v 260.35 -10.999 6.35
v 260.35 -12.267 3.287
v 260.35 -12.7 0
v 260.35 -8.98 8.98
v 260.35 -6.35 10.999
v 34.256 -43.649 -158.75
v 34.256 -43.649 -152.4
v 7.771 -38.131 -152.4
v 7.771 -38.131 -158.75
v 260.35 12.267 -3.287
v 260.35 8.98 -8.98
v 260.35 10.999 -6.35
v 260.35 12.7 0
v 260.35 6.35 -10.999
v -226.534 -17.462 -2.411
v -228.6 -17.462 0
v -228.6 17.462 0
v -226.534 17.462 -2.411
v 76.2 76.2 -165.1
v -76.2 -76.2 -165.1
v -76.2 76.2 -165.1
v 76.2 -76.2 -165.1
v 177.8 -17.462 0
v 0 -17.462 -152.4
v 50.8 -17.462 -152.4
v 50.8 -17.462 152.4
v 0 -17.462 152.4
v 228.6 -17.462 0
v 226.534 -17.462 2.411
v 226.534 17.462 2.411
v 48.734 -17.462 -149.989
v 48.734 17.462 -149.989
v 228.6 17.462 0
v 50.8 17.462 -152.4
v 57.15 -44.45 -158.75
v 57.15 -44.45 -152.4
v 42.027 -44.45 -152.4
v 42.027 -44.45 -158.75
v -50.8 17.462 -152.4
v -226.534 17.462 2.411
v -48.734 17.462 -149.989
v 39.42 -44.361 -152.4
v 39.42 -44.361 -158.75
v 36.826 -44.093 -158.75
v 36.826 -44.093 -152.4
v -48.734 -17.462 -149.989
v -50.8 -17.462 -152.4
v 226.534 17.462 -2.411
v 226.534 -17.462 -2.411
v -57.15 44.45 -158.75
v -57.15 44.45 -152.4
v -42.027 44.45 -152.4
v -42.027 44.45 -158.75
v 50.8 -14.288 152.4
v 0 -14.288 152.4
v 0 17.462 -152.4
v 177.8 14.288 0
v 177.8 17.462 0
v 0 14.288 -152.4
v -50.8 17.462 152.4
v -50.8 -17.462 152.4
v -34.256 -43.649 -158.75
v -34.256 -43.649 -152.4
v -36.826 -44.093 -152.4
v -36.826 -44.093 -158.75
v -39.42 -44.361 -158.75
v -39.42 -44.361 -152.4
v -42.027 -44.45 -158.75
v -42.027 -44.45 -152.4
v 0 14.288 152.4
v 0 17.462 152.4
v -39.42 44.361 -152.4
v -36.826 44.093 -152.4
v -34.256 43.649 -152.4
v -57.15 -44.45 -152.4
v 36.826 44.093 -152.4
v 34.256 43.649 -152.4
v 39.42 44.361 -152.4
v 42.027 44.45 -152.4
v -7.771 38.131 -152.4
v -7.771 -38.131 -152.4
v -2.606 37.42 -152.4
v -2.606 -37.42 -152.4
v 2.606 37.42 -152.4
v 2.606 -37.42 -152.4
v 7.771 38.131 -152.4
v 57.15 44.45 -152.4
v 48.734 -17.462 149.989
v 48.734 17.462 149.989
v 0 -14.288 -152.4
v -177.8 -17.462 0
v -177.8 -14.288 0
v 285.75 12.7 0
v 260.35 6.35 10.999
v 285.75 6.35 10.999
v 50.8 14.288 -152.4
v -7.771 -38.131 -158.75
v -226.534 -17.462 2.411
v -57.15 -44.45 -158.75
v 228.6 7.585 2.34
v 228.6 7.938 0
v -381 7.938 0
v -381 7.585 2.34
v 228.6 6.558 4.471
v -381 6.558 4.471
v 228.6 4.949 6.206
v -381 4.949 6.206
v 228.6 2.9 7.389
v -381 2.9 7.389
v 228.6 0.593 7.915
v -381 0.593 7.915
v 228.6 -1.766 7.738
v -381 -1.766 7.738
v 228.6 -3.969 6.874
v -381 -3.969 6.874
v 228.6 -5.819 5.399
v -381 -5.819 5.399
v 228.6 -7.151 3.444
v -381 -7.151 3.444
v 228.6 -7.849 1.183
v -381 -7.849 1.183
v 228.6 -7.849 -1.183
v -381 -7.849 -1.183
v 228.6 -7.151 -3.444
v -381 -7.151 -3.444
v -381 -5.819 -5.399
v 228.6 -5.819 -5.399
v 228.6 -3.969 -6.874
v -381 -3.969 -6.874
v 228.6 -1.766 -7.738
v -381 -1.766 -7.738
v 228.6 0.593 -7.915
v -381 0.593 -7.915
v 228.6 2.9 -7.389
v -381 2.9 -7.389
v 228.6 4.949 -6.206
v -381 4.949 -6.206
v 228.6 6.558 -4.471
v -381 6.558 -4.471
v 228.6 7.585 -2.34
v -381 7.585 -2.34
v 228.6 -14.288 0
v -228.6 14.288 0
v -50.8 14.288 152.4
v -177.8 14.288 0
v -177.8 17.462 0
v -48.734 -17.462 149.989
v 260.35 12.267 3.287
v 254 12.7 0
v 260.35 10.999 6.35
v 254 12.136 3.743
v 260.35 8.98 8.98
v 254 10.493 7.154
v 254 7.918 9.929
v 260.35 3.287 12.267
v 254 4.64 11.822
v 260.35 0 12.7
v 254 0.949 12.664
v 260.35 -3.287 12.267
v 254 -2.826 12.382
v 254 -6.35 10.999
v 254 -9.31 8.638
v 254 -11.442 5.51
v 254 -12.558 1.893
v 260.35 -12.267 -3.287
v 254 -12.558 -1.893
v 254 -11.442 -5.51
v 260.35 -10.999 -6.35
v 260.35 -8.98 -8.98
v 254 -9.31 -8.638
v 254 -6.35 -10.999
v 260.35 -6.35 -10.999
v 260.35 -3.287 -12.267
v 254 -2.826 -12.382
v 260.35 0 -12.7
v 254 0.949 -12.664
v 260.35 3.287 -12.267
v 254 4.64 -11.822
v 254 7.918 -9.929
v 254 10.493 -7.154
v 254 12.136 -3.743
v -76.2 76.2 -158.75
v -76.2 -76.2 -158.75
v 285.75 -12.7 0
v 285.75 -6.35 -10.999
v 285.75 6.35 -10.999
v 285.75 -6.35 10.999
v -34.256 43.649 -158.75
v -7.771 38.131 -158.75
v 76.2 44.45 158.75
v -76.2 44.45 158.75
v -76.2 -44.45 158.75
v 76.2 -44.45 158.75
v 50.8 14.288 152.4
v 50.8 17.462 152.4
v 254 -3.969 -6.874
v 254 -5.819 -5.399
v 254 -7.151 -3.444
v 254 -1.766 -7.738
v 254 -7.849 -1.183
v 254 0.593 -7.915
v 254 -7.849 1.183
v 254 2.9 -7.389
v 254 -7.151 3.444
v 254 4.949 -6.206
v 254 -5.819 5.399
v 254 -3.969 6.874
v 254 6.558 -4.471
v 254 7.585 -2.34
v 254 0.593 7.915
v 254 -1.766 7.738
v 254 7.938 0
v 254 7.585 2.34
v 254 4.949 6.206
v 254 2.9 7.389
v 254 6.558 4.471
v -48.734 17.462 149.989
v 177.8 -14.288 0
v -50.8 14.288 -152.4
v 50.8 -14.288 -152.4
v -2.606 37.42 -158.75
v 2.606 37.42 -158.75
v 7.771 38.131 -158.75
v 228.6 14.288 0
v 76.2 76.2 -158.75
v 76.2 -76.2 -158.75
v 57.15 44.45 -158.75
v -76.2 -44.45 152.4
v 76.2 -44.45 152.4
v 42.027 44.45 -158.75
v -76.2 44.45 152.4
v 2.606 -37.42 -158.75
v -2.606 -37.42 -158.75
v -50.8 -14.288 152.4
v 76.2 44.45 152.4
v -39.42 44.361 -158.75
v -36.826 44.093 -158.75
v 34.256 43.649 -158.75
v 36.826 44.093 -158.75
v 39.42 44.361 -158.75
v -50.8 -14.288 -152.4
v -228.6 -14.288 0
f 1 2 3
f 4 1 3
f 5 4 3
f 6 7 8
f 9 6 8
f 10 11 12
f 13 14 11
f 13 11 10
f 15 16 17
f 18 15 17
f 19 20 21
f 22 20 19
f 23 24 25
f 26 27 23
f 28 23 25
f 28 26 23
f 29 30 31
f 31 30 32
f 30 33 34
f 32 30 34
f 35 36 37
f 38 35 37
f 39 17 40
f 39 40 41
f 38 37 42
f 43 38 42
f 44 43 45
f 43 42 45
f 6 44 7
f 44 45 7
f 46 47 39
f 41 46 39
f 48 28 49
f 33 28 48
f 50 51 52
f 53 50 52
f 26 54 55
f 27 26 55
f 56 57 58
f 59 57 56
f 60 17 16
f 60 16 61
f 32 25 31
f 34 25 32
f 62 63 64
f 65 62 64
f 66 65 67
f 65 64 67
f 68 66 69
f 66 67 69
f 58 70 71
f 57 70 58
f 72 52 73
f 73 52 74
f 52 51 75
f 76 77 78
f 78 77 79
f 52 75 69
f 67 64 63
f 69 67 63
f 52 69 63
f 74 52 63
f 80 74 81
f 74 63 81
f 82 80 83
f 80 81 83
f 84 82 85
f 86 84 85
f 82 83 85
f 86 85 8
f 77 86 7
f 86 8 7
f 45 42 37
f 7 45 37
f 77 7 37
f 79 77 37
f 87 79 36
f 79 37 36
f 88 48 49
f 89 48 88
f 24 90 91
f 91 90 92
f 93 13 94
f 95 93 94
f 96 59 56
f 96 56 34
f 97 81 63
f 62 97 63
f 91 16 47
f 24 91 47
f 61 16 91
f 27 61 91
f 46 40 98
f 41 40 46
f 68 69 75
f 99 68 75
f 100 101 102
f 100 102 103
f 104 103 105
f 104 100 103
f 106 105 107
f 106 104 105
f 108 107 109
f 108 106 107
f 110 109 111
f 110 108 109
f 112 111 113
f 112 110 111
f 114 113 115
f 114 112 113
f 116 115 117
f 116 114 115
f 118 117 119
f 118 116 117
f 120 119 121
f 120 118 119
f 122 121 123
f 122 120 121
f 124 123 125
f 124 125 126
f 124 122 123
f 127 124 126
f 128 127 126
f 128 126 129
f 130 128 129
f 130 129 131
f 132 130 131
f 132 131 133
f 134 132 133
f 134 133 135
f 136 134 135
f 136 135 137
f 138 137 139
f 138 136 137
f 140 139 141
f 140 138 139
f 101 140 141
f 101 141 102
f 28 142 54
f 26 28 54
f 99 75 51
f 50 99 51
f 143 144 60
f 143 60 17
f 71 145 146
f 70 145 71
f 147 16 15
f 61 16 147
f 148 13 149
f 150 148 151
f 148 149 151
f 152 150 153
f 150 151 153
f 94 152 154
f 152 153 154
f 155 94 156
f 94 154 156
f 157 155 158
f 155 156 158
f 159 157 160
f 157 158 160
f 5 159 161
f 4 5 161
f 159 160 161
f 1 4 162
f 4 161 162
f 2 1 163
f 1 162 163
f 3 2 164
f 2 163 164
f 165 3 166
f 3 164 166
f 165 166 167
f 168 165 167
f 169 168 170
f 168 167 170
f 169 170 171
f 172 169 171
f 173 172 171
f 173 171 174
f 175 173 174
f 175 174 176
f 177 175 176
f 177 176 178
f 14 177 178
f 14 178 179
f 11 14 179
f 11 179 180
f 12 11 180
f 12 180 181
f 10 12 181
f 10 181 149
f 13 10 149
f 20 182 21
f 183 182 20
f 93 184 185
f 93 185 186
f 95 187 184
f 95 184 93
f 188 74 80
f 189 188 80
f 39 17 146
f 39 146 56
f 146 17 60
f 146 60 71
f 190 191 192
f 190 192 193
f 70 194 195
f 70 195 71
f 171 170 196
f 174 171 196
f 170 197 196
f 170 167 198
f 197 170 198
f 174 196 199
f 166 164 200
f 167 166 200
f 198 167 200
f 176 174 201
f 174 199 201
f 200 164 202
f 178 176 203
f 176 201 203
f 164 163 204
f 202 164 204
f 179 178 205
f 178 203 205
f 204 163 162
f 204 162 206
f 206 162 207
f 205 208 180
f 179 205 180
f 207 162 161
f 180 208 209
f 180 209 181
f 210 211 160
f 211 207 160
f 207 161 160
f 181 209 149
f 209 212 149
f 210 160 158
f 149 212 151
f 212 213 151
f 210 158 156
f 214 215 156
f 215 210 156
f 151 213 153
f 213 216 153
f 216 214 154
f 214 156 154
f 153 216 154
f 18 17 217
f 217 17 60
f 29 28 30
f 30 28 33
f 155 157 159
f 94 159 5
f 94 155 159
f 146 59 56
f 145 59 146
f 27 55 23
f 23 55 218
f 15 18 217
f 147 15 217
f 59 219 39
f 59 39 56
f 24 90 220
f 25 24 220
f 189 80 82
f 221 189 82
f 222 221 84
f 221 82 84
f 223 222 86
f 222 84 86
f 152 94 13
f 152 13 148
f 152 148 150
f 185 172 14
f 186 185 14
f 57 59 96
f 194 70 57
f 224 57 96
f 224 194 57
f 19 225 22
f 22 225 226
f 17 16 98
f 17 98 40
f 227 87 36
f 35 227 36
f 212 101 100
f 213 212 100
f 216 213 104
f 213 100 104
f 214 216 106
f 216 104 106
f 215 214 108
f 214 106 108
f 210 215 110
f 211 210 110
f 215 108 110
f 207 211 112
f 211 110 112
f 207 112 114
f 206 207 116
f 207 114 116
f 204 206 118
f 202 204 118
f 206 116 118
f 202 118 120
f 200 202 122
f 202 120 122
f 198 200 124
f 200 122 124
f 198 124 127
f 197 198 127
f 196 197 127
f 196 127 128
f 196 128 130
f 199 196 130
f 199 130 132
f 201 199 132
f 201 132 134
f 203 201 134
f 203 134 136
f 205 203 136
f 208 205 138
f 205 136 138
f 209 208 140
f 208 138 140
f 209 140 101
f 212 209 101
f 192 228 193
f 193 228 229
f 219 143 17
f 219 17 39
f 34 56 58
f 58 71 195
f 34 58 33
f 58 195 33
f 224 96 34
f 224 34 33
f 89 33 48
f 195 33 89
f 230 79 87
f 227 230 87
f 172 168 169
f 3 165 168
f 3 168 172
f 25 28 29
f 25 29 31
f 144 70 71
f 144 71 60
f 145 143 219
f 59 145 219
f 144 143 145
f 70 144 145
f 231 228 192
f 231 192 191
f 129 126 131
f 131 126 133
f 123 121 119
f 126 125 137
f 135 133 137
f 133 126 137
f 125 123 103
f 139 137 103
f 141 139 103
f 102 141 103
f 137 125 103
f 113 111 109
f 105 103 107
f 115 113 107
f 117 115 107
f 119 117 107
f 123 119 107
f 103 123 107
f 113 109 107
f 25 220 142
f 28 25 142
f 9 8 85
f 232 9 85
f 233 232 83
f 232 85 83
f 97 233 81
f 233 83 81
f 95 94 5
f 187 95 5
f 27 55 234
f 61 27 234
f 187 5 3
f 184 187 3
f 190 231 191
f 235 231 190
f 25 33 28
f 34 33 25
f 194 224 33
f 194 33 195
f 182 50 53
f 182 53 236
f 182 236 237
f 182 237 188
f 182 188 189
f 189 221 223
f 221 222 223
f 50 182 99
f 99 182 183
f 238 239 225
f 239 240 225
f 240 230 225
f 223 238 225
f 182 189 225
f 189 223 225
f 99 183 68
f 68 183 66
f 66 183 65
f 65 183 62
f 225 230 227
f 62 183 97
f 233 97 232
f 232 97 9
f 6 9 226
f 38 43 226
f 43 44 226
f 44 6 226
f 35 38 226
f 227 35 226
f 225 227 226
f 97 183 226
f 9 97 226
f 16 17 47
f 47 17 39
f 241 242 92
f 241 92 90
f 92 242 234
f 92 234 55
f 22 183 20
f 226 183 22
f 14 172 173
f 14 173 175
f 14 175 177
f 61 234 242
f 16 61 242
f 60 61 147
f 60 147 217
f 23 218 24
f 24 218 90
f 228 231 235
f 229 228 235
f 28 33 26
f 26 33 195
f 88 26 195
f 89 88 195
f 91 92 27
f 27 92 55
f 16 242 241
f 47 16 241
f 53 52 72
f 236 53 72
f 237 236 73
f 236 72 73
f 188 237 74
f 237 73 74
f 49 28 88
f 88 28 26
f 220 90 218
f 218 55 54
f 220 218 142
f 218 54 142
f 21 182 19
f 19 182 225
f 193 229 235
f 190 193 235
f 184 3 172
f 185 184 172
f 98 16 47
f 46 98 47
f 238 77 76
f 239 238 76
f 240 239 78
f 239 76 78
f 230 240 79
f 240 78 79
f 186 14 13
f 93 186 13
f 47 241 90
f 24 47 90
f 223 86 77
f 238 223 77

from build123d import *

# Parameters (mm, degrees)
F2_DEPTH  = 3.175
F4_W      = 234.1764292152
F4_H      = 34.925
F5_DEPTH  = 3.175
F8_W      = 152.4
F8_H      = 88.9
F9_DEPTH  = 6.35
F11_DEPTH = 6.35
F13_R     = 7.9375
F14_DEPTH = 609.6
F15_R     = 7.9375
F16_DEPTH = 25.4
F17_R     = 12.7
F18_DEPTH = 6.35
F20_DEPTH = 25.4
F21_W     = 152.4
F21_H     = 152.4
F22_DEPTH = 6.35


with BuildPart() as f2:
    # F1 (on offset) → F2 (new body)
    with BuildSketch(Plane.XZ.offset(14.2875)):
        Polygon((-177.8, 0), (0, 152.4), (-50.8, 152.4), (-228.6, 0), (-50.8, -152.4), (0, -152.4), align=None)
    extrude(amount=F2_DEPTH)


with BuildPart() as f2b:
    # F1 (on offset) → F2, piece 2 (new body)
    with BuildSketch(Plane.XZ.offset(14.2875)):
        Polygon((50.8, 152.4), (0, 152.4), (177.8, 0), (0, -152.4), (50.8, -152.4), (228.6, 0), align=None)
    extrude(amount=F2_DEPTH)


with BuildPart() as f3_1:
    # F3: instance of F2
    add(f2.part.mirror(Plane.XZ))


with BuildPart() as f3_2:
    # F3: instance of F2b
    add(f2b.part.mirror(Plane.XZ))


with BuildPart() as f5:
    # F4 (on face) → F5 (new body)
    with BuildSketch(Plane(origin=(-96.8188235294, 0, 112.9552941176), x_dir=(0.7592566024, 0, 0.6507913735), z_dir=(-0.6507913735, 0, 0.7592566024))):
        with Locations((-56.4778446931, 0)):
            Rectangle(F4_W, F4_H)
    extrude(amount=-F5_DEPTH)


with BuildPart() as f6_1:
    # F6: instance of F5
    add(f5.part.mirror(Plane.XY))


with BuildPart() as f7_1:
    # F7: instance of F5
    add(f5.part.mirror(Plane.YZ))


with BuildPart() as f7_2:
    # F7: instance of F6_1
    add(f6_1.part.mirror(Plane.YZ))


with BuildPart() as f9:
    # F8 (on face) → F9 (new body)
    with BuildSketch(Plane.XY.offset(152.4)):
        Rectangle(F8_W, F8_H)
    extrude(amount=F9_DEPTH)


with BuildPart() as f11:
    # F10 (on face) → F11 (new body)
    with BuildSketch(Plane(origin=(0, 0, -152.4), x_dir=(1, 0, 0), z_dir=(0, 0, -1))):
        with BuildLine():
            Line((-42.0265962433, 44.45), (-57.15, 44.45))
            Line((-57.15, 44.45), (-57.15, -44.45))
            Line((-57.15, -44.45), (-42.0265962433, -44.45))
            ThreePointArc((-42.0265962433, -44.45), (-38.1206883524, -44.2492596702), (-34.2559391616, -43.649153992))
            Line((-34.2559391616, -43.649153992), (-7.7706570817, -38.131386892))
            ThreePointArc((-7.7706570817, -38.131386892), (0, -37.330540884), (7.7706570817, -38.131386892))
            Line((7.7706570817, -38.131386892), (34.2559391616, -43.649153992))
            ThreePointArc((34.2559391616, -43.649153992), (38.1206883524, -44.2492596702), (42.0265962433, -44.45))
            Line((42.0265962433, -44.45), (57.15, -44.45))
            Line((57.15, -44.45), (57.15, 44.45))
            Line((57.15, 44.45), (42.0265962433, 44.45))
            ThreePointArc((42.0265962433, 44.45), (38.1206883524, 44.2492596702), (34.2559391616, 43.649153992))
            Line((34.2559391616, 43.649153992), (7.7706570817, 38.131386892))
            ThreePointArc((7.7706570817, 38.131386892), (0, 37.330540884), (-7.7706570817, 38.131386892))
            Line((-7.7706570817, 38.131386892), (-34.2559391616, 43.649153992))
            ThreePointArc((-34.2559391616, 43.649153992), (-38.1206883524, 44.2492596702), (-42.0265962433, 44.45))
        make_face()
    extrude(amount=F11_DEPTH)

    # F21 (on face) → F22 (join)
    with BuildSketch(Plane(origin=(0, 0, -158.75), x_dir=(1, 0, 0), z_dir=(0, 0, -1))):
        Rectangle(F21_W, F21_H)
    extrude(amount=F22_DEPTH)


with BuildPart() as f14:
    # F13 (on offset) → F14 (new body)
    with BuildSketch(Plane.YZ.offset(228.6)):
        Circle(F13_R)
    extrude(amount=-F14_DEPTH)

    # F15 (on face) → F16 (join)
    with BuildSketch(Plane.YZ.offset(228.6)):
        Circle(F15_R)
    extrude(amount=F16_DEPTH)

    # F17 (on face) → F18 (join)
    with BuildSketch(Plane.YZ.offset(254)):
        Circle(F17_R)
    extrude(amount=F18_DEPTH)

    # F19 (on face) → F20 (join)
    with BuildSketch(Plane.YZ.offset(260.35)):
        Polygon((12.7, 0), (6.35, 10.9985226281), (-6.35, 10.9985226281), (-12.7, 0), (-6.35, -10.9985226281), (6.35, -10.9985226281), align=None)
    extrude(amount=F20_DEPTH)


solid = Compound([f2.part, f2b.part, f3_1.part, f3_2.part, f5.part, f6_1.part, f7_1.part, f7_2.part, f9.part, f11.part, f14.part])
